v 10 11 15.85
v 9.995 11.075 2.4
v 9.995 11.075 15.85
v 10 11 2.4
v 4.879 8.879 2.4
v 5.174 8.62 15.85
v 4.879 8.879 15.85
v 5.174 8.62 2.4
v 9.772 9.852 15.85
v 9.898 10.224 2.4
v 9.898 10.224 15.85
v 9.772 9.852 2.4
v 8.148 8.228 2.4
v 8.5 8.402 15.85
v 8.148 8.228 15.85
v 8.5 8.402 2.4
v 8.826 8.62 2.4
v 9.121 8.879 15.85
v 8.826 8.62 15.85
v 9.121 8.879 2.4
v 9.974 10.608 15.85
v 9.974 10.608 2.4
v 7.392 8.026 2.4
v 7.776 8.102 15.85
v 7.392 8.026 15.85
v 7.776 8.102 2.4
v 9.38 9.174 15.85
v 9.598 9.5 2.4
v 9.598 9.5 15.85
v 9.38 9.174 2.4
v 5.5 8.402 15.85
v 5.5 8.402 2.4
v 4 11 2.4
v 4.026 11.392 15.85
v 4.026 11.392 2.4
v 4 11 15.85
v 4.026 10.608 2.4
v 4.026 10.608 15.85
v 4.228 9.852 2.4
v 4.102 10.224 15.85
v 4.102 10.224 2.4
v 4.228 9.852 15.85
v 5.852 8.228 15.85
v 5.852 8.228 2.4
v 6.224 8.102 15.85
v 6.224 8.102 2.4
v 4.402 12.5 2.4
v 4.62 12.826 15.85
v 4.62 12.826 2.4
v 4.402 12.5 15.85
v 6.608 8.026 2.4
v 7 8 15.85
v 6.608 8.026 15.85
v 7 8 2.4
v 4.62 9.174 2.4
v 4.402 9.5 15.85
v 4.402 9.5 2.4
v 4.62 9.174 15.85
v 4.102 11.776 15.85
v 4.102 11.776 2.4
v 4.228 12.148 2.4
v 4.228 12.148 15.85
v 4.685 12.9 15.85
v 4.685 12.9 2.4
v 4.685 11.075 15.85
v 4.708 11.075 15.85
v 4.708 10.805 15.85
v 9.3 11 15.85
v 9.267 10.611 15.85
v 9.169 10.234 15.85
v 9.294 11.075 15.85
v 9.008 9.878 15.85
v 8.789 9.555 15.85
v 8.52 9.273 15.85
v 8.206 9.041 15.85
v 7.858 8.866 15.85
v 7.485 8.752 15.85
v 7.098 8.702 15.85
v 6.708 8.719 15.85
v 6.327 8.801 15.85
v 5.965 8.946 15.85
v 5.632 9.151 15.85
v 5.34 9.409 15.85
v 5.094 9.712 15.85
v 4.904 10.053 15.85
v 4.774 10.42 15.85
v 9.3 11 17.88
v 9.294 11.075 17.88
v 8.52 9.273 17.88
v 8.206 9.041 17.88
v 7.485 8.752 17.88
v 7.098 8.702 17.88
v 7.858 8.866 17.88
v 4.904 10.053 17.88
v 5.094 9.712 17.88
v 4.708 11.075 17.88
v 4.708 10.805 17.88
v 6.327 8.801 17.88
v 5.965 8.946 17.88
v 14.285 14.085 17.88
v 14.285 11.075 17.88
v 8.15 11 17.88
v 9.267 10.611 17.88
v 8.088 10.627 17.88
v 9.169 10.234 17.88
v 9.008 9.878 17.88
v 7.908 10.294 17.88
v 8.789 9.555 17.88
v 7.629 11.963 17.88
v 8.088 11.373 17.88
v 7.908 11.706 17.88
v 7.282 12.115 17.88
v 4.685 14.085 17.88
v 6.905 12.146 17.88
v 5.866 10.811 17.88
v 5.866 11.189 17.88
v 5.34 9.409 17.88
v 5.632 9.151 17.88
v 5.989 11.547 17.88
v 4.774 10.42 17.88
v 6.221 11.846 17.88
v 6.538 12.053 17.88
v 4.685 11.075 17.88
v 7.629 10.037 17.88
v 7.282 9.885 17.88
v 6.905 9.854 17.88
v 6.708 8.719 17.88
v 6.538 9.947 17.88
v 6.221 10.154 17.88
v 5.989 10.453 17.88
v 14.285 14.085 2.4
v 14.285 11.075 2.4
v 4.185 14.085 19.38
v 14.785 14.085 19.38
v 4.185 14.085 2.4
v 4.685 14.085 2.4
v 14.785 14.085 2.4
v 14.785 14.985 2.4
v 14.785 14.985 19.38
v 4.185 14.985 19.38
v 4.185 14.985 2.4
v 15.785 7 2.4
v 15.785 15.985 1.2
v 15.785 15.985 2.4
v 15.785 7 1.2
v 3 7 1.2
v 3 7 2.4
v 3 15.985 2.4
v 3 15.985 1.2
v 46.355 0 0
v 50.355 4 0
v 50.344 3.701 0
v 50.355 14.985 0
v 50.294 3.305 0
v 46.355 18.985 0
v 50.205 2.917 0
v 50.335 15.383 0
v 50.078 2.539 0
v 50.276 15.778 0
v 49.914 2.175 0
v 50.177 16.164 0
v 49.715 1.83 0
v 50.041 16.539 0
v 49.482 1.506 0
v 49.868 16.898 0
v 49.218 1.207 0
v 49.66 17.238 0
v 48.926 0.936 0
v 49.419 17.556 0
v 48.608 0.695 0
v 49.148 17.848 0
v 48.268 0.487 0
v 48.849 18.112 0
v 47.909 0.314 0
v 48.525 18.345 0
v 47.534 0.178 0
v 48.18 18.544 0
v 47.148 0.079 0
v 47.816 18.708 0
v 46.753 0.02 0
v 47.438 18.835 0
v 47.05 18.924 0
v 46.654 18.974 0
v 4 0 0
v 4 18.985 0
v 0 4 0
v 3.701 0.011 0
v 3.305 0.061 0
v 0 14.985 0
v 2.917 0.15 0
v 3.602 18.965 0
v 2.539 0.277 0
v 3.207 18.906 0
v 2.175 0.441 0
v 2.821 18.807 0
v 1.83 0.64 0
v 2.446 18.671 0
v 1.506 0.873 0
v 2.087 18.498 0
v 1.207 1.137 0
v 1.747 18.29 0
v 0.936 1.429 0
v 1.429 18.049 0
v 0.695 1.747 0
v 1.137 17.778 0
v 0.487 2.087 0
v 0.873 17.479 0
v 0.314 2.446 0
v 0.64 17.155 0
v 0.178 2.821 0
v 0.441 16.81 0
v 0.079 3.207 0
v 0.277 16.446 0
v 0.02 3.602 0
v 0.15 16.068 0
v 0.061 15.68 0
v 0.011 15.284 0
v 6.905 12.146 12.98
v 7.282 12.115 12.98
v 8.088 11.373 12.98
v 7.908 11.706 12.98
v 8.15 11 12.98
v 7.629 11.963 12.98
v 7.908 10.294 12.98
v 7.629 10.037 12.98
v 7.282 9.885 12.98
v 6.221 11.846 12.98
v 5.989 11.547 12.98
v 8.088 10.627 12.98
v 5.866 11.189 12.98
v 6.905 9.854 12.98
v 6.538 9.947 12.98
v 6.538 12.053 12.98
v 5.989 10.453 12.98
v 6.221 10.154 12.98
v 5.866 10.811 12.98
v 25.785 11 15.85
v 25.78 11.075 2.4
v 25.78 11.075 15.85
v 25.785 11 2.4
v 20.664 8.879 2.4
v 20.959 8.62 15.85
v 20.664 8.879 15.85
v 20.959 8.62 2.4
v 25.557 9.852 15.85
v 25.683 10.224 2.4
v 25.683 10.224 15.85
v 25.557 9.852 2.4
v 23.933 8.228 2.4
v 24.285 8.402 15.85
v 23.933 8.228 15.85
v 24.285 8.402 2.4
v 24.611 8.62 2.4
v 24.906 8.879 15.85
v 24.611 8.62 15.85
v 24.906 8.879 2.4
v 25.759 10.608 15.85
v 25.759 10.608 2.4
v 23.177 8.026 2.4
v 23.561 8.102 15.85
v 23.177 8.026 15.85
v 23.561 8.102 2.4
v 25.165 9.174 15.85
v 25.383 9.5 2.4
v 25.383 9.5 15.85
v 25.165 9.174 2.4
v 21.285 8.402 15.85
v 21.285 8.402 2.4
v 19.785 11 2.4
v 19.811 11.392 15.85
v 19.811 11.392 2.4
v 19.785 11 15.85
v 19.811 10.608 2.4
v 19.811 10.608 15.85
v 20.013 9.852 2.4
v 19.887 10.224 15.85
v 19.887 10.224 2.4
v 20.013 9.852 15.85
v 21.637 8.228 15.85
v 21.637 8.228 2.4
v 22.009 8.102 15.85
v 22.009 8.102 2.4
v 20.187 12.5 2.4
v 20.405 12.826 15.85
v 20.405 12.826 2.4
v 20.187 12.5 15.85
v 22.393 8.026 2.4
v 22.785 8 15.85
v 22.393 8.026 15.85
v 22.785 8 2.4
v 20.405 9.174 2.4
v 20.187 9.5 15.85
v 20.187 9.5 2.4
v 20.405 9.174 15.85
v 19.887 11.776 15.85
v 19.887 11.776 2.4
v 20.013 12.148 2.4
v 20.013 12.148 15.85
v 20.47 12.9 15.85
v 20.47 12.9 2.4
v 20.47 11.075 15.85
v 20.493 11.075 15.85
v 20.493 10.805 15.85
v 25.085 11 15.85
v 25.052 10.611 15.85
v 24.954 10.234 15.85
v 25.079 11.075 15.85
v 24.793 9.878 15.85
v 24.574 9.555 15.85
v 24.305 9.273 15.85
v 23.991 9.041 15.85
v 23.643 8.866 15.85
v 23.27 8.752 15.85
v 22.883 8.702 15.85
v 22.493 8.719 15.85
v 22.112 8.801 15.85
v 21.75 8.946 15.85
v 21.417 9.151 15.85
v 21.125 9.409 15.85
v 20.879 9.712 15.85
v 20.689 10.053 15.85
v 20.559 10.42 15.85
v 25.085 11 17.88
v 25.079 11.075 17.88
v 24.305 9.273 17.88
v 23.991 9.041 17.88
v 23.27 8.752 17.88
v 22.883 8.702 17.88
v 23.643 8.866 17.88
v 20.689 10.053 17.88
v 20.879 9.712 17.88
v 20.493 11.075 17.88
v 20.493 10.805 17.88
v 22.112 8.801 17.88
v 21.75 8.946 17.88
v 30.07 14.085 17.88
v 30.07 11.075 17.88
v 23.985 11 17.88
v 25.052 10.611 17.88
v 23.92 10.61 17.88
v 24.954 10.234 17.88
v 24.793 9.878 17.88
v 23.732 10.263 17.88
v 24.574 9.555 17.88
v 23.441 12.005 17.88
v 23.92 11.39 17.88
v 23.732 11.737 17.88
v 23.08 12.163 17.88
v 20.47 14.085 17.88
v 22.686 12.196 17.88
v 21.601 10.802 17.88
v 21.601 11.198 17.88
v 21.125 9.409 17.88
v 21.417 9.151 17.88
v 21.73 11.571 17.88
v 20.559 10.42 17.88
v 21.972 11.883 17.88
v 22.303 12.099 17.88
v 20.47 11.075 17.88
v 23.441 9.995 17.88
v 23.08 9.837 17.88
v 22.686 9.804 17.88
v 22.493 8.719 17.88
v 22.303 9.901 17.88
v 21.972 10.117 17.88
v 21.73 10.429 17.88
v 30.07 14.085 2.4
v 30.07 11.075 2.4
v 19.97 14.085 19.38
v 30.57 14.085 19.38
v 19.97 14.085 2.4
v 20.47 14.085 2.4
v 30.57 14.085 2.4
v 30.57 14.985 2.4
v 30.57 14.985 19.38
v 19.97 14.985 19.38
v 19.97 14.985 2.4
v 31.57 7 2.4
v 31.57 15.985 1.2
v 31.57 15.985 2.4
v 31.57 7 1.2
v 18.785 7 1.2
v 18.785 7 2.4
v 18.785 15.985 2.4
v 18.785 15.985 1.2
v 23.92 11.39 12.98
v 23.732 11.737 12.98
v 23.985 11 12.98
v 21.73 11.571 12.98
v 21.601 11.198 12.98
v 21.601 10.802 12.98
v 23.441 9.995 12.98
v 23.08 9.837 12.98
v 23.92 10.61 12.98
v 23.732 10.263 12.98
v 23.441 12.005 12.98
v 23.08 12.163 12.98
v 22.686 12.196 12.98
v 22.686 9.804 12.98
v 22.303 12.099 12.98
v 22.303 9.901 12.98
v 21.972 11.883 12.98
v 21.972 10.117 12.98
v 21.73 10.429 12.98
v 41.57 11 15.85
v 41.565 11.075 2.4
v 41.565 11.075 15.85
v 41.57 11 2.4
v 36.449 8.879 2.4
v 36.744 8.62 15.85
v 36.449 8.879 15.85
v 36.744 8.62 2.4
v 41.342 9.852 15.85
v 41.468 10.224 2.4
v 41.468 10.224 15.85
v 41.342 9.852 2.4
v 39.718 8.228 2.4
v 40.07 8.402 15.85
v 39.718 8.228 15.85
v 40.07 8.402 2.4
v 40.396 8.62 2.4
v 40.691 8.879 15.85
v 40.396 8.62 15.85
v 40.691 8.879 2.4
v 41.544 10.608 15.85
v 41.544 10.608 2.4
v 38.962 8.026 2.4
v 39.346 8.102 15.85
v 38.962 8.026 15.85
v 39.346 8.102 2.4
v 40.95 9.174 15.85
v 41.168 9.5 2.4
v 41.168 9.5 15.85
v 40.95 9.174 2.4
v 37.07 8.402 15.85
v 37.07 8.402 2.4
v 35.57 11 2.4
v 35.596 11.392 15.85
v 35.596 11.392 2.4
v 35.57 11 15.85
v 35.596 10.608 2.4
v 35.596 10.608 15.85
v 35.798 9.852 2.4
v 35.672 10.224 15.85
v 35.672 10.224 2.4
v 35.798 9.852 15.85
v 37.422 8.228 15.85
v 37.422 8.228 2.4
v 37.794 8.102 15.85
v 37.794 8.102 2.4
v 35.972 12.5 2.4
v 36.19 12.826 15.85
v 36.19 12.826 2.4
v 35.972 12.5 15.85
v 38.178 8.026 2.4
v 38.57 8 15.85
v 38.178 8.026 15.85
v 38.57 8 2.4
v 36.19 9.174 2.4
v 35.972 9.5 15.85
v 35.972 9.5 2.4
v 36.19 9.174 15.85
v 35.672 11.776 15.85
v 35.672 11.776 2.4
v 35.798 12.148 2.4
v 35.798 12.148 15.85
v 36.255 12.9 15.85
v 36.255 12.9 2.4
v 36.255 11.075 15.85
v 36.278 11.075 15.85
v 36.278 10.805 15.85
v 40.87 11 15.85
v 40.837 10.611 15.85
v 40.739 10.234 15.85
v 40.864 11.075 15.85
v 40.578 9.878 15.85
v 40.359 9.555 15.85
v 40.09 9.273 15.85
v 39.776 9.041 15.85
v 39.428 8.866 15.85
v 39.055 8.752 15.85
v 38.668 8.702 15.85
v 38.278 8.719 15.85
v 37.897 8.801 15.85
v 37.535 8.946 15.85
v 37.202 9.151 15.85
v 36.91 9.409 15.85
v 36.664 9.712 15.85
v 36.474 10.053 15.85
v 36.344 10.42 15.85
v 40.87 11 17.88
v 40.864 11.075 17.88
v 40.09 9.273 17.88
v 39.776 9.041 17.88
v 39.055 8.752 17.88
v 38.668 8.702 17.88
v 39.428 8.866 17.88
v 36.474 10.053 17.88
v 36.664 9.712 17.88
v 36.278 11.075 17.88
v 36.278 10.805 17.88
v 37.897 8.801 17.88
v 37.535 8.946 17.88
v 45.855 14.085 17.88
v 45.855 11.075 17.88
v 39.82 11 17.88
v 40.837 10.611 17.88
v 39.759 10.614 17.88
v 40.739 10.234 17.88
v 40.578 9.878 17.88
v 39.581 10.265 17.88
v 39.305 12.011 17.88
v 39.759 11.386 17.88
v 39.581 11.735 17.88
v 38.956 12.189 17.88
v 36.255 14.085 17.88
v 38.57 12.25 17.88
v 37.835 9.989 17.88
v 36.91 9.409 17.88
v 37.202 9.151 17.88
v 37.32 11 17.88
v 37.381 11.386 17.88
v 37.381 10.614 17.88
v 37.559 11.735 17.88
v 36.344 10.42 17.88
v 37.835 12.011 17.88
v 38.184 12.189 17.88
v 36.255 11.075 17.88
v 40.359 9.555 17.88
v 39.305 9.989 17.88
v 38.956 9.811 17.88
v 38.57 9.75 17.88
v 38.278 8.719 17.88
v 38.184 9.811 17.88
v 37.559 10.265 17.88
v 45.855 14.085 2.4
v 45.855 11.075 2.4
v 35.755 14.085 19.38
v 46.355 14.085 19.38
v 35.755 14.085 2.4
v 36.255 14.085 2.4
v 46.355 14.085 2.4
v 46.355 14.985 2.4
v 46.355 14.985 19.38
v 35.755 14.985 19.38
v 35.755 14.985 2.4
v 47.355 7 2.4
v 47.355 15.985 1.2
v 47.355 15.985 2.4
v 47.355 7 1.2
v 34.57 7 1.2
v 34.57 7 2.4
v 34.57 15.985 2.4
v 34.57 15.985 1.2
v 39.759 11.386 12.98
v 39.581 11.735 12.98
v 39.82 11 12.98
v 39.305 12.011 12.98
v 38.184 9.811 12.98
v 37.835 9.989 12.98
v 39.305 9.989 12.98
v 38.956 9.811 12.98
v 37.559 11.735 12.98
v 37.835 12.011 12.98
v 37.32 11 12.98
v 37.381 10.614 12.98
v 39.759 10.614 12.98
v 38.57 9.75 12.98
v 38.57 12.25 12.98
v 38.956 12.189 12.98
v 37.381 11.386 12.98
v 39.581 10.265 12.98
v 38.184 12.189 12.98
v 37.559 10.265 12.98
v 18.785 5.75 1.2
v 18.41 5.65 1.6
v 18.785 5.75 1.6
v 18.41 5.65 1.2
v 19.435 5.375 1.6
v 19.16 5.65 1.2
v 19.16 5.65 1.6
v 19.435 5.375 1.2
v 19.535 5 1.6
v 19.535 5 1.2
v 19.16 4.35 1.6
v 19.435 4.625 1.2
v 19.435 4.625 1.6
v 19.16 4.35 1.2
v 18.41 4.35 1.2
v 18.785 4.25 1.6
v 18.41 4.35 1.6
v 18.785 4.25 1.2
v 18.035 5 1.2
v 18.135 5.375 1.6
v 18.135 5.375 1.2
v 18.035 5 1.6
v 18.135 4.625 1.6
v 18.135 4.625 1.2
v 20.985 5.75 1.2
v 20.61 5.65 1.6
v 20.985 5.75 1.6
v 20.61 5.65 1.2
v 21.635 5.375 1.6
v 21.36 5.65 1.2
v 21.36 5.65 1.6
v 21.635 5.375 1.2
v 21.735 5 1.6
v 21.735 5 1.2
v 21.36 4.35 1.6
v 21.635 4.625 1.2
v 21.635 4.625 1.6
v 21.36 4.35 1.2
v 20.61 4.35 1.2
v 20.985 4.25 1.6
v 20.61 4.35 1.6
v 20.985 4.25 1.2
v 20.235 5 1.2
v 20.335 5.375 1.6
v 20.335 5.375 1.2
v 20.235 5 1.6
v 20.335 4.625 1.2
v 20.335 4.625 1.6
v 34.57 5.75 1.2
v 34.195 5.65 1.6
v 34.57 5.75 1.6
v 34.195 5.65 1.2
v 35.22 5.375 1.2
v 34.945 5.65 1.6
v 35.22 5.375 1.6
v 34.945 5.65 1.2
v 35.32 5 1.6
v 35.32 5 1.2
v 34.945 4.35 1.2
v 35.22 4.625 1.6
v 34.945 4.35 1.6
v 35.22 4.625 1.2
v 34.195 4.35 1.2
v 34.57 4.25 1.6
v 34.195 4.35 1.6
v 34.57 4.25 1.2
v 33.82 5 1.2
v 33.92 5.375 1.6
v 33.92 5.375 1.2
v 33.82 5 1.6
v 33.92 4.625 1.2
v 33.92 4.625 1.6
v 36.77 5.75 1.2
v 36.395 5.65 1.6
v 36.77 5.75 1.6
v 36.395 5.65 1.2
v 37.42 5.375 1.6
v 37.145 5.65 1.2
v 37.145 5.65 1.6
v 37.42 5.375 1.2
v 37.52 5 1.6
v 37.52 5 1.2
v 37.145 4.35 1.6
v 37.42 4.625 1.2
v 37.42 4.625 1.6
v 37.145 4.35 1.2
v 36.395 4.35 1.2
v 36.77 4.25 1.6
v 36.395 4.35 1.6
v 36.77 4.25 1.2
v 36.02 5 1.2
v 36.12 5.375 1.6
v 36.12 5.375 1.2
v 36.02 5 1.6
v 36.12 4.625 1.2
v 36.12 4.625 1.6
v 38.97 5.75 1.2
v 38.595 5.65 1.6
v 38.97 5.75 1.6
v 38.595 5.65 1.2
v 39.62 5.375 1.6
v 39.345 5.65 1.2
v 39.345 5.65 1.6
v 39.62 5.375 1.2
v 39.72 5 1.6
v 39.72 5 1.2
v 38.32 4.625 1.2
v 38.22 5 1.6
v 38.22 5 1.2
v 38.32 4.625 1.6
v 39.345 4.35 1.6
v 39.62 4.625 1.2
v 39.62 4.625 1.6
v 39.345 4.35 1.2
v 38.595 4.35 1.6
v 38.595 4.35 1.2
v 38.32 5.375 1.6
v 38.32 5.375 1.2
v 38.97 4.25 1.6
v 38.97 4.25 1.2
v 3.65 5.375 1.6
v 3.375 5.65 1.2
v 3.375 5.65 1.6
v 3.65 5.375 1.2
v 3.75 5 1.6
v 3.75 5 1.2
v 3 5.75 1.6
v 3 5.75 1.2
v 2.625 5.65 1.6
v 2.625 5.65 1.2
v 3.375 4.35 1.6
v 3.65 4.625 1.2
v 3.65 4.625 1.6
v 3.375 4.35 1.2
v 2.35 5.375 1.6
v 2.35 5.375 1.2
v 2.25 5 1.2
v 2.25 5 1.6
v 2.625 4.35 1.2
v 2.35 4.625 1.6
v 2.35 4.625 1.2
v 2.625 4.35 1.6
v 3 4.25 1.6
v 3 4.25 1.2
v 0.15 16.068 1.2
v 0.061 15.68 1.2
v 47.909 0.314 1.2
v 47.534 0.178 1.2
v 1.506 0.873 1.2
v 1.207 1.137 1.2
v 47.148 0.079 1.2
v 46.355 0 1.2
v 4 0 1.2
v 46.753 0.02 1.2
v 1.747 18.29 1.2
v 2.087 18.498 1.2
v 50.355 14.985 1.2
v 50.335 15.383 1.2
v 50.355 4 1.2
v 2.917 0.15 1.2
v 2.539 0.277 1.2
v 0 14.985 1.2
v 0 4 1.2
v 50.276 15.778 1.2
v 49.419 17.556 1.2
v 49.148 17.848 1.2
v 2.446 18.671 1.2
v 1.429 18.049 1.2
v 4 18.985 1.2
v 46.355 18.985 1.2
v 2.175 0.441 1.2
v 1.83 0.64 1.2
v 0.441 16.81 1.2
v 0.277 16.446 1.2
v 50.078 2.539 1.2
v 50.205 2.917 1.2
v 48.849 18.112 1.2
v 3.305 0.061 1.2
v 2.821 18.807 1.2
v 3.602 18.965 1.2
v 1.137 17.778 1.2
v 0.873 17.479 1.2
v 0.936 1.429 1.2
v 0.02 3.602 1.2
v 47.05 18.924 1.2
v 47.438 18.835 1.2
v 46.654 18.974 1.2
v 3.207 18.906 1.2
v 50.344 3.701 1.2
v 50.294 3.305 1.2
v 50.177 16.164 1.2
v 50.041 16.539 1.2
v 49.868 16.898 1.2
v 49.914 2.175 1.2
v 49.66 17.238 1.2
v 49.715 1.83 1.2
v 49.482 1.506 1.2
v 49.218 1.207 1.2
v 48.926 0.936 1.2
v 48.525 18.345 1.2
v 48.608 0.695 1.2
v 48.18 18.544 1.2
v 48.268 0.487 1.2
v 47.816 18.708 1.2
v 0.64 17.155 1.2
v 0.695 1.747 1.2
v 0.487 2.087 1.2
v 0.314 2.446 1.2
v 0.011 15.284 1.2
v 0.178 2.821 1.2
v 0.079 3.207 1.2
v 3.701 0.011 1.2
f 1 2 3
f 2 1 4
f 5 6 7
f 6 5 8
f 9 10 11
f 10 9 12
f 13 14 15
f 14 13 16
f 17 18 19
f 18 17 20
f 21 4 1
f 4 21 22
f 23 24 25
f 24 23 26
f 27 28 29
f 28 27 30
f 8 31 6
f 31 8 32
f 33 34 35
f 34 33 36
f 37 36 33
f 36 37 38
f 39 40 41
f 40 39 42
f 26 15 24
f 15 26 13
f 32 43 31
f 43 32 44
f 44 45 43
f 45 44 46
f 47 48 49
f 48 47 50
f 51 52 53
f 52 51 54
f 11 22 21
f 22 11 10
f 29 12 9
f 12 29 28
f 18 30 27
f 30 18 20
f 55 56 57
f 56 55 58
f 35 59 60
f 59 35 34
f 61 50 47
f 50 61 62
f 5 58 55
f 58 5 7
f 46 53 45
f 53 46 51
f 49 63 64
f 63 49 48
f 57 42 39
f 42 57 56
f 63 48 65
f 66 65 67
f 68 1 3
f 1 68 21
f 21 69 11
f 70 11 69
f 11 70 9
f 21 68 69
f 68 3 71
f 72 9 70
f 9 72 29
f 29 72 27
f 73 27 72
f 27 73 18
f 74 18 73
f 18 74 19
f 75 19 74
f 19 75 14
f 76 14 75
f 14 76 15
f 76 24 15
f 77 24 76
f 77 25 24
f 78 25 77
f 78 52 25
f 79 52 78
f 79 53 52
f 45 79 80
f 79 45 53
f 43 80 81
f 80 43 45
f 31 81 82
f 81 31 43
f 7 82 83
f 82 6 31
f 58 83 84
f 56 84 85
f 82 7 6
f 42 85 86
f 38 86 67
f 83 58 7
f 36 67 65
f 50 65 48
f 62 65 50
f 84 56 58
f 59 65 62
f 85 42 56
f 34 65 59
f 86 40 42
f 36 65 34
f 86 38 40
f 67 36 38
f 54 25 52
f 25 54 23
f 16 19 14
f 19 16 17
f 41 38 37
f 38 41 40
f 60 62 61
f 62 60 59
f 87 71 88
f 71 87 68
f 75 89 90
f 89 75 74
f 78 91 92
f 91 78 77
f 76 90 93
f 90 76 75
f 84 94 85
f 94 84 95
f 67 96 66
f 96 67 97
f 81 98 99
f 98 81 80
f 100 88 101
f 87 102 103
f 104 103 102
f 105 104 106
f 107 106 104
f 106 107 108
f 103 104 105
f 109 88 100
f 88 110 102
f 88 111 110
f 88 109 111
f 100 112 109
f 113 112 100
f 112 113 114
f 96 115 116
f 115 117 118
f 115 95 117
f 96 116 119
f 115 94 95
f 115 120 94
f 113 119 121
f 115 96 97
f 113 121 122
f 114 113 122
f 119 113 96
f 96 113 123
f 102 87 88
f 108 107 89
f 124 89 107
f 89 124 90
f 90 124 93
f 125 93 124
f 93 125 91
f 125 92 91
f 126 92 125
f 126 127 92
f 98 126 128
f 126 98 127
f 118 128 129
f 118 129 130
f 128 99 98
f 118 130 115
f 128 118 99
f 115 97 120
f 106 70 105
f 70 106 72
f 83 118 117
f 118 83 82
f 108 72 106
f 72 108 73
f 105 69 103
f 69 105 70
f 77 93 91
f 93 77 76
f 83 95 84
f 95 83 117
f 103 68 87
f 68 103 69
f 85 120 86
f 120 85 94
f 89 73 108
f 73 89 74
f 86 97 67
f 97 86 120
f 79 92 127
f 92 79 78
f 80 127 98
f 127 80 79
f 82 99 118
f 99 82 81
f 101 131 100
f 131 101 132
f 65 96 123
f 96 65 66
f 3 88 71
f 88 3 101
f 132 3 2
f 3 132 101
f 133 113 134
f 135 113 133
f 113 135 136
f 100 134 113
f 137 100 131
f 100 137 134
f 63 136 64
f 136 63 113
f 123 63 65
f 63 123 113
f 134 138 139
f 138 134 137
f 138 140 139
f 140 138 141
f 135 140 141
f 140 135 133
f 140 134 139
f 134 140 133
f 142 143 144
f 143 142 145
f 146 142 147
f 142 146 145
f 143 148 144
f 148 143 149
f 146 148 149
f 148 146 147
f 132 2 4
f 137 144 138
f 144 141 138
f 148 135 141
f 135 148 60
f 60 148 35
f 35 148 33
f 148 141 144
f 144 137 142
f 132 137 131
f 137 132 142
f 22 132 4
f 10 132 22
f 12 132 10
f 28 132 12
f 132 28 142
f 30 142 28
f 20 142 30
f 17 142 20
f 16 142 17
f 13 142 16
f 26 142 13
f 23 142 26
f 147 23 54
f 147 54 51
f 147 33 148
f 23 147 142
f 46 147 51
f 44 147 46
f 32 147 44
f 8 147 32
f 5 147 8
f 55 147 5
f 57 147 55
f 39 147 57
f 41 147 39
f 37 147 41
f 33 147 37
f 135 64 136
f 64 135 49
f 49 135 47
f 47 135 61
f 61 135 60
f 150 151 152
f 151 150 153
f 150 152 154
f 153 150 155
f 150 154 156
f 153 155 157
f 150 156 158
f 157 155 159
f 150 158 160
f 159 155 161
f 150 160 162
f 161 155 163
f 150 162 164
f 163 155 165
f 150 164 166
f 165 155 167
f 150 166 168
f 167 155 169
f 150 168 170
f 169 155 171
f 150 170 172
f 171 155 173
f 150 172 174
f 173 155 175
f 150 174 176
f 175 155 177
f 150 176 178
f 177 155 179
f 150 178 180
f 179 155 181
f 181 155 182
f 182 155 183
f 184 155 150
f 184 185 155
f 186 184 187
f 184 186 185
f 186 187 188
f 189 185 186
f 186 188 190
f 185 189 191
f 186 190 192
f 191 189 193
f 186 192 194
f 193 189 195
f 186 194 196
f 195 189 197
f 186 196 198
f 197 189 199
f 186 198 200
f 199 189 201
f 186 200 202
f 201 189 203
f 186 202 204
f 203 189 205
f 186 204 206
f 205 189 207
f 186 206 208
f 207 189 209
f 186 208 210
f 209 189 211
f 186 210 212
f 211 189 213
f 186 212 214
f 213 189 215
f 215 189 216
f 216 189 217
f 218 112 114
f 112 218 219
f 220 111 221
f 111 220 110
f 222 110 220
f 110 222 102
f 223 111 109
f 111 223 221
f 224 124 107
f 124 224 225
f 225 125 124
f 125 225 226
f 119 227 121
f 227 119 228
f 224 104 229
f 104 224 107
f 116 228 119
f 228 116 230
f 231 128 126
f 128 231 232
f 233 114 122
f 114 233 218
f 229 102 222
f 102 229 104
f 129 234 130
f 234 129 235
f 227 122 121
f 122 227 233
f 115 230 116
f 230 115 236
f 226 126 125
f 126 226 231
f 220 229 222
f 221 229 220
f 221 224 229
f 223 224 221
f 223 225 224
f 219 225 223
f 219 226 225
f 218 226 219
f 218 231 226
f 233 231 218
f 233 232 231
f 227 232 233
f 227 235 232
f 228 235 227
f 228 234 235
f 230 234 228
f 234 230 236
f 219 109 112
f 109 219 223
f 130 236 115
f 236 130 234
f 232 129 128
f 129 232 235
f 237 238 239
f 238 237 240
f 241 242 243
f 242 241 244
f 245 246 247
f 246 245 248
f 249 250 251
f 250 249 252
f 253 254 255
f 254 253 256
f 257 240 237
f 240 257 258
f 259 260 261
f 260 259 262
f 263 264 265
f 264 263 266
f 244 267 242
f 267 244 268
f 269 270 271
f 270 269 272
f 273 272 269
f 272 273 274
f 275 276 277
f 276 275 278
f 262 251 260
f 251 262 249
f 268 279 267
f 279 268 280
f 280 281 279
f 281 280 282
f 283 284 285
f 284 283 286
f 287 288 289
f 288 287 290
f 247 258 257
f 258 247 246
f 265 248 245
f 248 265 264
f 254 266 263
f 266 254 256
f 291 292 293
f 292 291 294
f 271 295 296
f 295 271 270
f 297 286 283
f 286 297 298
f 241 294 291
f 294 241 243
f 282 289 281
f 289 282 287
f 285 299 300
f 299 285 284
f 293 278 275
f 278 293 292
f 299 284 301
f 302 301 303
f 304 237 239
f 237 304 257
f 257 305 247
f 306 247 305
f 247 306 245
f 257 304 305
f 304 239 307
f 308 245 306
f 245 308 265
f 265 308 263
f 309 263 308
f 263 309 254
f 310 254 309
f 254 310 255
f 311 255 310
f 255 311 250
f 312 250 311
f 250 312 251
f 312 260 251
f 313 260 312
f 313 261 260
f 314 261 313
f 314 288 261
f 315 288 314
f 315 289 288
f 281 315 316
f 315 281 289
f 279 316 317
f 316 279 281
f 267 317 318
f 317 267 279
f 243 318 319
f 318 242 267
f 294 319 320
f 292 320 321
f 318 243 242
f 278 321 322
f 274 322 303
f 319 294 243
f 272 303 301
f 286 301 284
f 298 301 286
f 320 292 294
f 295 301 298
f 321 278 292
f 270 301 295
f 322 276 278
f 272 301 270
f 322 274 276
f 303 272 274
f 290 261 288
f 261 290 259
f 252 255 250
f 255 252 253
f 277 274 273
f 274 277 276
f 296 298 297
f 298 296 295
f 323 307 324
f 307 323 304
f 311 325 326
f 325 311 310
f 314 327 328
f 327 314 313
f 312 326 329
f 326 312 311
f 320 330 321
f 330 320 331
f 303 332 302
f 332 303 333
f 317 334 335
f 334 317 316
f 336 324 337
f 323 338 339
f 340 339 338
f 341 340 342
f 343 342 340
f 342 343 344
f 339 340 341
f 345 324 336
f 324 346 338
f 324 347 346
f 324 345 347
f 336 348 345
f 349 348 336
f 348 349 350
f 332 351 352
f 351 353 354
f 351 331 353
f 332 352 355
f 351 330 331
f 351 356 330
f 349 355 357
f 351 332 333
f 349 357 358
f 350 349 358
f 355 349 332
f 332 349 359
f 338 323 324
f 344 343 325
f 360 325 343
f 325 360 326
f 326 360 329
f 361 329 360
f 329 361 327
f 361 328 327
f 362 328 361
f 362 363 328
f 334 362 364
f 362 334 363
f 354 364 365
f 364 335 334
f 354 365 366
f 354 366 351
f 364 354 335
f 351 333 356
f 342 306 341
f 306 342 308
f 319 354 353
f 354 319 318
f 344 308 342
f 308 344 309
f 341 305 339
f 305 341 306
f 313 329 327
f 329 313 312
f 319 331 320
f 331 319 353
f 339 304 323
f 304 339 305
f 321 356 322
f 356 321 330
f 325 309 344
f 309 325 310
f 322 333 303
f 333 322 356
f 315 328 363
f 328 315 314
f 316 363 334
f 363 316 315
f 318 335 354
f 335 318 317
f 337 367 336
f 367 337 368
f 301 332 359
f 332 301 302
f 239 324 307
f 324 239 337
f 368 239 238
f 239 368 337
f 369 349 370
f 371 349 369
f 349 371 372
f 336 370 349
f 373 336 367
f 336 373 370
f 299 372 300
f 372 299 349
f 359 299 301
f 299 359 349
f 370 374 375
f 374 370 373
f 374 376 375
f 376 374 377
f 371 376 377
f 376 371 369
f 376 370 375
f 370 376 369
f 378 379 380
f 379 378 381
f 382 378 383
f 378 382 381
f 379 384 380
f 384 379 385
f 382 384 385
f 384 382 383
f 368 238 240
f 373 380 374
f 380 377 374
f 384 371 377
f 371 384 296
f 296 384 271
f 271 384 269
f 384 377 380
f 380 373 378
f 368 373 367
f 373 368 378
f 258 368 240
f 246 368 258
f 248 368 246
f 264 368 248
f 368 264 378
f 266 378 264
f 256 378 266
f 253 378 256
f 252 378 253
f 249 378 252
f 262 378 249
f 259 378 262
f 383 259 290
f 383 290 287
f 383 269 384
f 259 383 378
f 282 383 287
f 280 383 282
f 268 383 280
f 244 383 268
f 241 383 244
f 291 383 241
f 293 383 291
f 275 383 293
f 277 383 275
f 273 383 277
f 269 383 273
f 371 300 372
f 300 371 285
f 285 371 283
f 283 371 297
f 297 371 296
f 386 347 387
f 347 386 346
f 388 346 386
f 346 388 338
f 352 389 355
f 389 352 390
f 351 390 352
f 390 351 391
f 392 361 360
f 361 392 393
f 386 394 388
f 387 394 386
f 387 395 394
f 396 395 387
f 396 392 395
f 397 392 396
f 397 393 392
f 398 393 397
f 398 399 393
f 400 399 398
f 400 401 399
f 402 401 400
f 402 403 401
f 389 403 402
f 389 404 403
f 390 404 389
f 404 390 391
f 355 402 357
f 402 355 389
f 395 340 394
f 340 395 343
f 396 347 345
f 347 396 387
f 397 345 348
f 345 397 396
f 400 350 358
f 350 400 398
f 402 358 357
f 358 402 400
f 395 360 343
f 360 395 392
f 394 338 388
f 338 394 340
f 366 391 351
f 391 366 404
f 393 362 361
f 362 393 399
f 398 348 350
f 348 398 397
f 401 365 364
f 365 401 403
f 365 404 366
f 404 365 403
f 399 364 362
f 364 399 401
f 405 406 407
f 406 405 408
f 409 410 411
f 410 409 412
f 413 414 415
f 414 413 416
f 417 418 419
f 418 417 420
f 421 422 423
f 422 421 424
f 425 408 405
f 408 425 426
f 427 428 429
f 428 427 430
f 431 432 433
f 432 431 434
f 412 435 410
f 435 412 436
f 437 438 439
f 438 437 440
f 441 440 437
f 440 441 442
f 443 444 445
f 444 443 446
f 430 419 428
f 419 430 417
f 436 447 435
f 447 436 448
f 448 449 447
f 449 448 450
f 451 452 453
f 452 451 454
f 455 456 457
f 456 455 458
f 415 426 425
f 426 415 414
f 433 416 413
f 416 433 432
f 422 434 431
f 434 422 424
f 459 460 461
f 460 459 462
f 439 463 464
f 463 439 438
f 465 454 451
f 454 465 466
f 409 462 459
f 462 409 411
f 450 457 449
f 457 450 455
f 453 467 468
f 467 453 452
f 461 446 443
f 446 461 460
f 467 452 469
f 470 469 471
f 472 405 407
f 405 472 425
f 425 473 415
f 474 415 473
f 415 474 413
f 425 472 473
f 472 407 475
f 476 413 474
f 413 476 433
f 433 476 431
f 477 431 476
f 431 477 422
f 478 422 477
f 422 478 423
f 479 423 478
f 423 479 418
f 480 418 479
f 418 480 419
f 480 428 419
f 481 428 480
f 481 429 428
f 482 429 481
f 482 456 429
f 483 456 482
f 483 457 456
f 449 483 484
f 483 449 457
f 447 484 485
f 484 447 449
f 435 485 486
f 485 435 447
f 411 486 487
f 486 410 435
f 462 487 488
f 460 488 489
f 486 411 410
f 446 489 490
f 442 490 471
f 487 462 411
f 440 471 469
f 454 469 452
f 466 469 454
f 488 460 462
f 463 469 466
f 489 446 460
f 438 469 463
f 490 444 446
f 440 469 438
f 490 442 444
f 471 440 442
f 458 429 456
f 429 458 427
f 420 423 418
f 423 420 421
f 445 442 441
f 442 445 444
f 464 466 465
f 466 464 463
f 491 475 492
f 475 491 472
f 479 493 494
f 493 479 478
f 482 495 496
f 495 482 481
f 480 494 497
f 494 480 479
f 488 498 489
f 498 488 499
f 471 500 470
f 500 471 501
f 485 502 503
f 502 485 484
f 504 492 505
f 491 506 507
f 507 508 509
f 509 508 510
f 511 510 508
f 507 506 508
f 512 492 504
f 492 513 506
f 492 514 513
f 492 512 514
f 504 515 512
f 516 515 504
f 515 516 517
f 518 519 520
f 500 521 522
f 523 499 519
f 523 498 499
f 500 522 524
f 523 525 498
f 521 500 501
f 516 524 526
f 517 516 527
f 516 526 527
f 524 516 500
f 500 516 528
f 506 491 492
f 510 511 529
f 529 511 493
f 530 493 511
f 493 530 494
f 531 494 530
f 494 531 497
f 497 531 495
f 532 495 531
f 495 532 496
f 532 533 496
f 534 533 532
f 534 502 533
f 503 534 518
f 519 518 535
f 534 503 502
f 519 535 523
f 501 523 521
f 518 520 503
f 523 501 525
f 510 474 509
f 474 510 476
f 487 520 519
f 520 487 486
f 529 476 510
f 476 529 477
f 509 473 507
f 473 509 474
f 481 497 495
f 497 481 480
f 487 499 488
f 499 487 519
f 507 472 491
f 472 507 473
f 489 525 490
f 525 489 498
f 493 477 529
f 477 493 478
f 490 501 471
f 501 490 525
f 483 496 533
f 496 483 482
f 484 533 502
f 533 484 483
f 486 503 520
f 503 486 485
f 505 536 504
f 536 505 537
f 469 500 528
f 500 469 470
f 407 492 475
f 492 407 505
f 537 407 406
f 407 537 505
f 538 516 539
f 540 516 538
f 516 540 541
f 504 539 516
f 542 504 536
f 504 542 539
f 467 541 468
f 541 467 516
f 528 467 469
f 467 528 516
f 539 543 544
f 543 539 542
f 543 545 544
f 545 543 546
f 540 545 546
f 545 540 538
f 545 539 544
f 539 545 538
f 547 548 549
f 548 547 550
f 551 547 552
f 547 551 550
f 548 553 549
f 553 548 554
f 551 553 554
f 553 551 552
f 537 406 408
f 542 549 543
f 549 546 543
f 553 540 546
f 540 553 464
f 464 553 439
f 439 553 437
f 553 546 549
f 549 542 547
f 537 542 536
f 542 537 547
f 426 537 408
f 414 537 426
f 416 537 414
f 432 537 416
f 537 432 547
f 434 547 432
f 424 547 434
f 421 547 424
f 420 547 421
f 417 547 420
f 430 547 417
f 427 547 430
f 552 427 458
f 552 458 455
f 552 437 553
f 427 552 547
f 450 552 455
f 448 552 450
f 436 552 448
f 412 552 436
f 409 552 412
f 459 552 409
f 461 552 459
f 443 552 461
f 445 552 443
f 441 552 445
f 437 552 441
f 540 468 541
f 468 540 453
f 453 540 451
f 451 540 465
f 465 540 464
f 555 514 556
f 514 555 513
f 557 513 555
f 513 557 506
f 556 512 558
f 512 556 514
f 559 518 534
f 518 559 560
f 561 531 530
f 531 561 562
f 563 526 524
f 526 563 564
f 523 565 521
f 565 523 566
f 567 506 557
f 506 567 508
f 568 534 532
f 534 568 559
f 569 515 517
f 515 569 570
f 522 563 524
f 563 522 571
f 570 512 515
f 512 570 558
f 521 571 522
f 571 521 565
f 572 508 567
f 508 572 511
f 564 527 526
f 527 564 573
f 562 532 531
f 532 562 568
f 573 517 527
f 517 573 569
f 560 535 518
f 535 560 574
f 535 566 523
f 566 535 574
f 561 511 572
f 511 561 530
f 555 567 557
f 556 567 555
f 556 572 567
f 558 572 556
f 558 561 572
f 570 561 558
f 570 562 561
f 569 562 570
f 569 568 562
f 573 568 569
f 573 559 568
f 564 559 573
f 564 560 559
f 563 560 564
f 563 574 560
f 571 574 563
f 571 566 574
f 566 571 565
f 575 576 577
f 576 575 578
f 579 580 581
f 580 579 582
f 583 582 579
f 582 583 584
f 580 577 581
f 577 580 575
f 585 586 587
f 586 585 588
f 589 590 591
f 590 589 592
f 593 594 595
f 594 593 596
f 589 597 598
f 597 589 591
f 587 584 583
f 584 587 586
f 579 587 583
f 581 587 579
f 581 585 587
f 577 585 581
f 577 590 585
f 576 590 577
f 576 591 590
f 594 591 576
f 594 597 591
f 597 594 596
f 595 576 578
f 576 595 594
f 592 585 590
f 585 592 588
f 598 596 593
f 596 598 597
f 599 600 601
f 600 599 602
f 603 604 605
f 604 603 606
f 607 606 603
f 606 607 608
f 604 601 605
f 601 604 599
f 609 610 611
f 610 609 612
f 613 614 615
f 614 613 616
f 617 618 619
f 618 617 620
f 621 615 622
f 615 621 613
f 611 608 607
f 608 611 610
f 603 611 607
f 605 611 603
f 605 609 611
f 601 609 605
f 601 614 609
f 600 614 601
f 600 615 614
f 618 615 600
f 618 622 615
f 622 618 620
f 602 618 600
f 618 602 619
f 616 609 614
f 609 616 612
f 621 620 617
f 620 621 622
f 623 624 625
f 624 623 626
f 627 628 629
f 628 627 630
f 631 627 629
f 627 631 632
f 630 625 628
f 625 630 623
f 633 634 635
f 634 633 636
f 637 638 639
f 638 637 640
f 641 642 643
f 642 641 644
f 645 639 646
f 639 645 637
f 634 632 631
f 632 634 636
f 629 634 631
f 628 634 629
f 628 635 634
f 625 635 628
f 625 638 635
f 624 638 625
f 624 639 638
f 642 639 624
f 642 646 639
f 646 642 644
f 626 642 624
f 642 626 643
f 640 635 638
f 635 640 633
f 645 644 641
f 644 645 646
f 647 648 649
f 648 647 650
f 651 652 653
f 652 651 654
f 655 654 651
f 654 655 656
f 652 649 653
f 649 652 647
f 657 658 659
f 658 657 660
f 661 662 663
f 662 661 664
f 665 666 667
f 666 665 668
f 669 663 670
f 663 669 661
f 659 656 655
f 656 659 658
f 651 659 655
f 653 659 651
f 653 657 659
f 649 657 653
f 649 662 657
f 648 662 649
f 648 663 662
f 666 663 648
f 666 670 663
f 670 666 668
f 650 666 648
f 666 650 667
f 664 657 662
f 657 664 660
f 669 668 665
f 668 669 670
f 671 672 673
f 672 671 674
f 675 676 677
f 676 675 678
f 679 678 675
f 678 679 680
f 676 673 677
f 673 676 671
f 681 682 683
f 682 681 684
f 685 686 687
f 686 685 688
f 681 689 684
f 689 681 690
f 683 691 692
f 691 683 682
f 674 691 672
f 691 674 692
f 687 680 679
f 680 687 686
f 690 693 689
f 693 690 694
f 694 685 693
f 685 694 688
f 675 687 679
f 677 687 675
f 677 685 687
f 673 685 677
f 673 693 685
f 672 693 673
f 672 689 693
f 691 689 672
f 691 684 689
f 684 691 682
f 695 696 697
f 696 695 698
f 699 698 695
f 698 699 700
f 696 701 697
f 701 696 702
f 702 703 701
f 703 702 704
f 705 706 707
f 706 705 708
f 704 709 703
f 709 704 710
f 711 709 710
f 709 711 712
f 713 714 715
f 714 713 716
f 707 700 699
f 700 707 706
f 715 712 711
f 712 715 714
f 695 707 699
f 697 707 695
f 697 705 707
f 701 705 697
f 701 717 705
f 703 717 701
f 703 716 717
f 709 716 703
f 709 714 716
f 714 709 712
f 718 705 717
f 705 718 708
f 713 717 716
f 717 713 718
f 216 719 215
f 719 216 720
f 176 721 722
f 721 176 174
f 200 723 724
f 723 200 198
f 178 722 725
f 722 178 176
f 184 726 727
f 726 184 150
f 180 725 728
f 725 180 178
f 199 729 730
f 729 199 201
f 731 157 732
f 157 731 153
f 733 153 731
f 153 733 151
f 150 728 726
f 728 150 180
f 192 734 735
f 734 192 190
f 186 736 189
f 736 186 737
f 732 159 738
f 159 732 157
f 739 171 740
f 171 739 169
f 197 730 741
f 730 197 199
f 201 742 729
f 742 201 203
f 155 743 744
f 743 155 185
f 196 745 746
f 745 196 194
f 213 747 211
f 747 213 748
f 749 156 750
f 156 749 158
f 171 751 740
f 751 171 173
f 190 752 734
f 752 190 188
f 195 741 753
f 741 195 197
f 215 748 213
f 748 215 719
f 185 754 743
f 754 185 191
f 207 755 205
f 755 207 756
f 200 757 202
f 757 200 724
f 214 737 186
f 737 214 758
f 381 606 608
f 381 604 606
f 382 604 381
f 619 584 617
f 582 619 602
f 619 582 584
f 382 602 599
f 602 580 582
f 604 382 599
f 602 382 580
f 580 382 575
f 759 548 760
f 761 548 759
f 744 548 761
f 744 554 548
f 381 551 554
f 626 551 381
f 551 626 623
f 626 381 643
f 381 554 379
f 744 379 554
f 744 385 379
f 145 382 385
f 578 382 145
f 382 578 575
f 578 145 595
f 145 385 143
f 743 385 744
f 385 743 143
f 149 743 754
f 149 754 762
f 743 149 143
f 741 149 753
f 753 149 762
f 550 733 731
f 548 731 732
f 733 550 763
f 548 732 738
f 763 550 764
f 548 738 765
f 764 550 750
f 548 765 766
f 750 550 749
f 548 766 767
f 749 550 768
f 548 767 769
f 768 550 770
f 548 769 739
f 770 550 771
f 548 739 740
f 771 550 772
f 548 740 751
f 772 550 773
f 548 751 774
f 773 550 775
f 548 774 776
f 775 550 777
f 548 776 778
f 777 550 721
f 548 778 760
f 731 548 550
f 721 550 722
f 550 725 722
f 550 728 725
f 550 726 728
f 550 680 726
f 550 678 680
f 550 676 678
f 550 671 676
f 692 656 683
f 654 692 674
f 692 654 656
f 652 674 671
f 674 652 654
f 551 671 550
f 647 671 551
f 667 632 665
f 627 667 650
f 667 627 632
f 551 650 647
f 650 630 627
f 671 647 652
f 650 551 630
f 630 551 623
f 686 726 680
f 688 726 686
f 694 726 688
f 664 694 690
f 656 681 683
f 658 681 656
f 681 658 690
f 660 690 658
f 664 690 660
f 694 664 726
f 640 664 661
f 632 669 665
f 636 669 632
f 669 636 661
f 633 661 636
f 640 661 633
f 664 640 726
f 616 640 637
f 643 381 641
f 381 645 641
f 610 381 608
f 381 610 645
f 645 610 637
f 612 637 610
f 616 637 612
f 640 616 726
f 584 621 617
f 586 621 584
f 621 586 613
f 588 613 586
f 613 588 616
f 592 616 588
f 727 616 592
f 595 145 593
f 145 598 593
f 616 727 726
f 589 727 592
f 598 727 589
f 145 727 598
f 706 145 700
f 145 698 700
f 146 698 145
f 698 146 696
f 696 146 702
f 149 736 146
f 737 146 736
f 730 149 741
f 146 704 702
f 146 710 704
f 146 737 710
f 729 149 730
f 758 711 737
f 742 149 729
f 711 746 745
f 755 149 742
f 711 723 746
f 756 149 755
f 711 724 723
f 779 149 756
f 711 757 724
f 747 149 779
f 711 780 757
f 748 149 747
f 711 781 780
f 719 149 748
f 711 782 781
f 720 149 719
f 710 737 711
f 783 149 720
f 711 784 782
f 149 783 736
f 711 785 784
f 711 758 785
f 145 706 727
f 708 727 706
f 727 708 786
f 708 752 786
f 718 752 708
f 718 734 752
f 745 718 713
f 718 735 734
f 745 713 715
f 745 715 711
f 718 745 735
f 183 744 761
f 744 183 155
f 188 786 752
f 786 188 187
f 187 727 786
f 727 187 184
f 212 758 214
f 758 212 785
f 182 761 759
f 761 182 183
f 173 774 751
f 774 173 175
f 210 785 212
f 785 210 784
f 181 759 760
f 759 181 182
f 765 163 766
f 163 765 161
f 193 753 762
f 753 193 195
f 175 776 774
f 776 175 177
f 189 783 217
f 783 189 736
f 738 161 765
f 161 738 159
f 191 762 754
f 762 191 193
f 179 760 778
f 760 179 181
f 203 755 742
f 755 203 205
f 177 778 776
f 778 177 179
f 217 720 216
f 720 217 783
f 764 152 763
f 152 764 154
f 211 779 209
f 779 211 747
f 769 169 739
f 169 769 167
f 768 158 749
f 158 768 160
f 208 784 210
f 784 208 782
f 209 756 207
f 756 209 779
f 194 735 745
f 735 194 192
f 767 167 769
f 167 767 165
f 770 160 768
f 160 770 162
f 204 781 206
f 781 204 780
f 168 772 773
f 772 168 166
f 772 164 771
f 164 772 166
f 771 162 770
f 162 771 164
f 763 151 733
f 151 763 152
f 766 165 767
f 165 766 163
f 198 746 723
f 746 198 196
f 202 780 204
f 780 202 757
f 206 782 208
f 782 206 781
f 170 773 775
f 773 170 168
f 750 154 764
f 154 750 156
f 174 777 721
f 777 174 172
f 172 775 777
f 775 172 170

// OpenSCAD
// SPDX-FileCopyrightText: 2026 Alon A. Rabinowitz
// SPDX-License-Identifier: CERN-OHL-S-2.0
// Open hardware, made available under the CERN Open Hardware Licence v2 - Strongly Reciprocal
// (LICENSES/CERN-OHL-S-2.0.txt), without any express or implied warranty: see the licence for its conditions.

/*
The clearance test for the air-quality monitor: one small print that tries every untested fit in
air-quality-monitor.params.scad at three settings - a step tighter, as set, and a step looser - so the box
is printed with fits that were tried in ASA on this printer rather than guessed.

It INCLUDES the box, and every piece is the box's own geometry, drawn by the box's own modules with only
the fit changed and turned onto the bed as the back plate is. So the test cannot drift from what it
tests, and each piece prints the way it will in the box. Each try carries 1, 2 or 3 dots: 1 = a step
tighter, 2 = as set, 3 = a step looser. docs/clearance-test.md says what to try with each, how to turn
the result into a setting, and what has been found so far.

  M  gy_pilot_d   three of the SGP41's mounts - post, rib and ledge - each with its pilot upright

This is the third round. The first two, of 2 Oct and 3 Oct 2026, settled every other fit; their pieces
are in the history.

draw_fits = false after including this file draws nothing, as fits-map.scad does.
*/
include <air-quality-monitor.scad>
draw_model = false;   // after the include: the box's own parts stay undrawn
draw_fits = true;

fit_step = 0.1;             // the step for every fit here
m = 3;                      // margin round and between the pieces
row = 4;                    // gap in front of each try, towards the printer's front; its dots sit in it
dot_d = 1.5;                // the tags: about three beads across, two layers proud
base_t = 6 * fdm_layer_h;   // 1.2 mm: the floor everything stands on

function ladder(v, s) = [v - s, v, v + s];
// Smaller is tighter. No hole may go under 2 mm (the rules below), so with the pilot at 2.0 the ladder
// starts there instead: 1 dot is then the setting itself.
gy_pilots = ladder(max(gy_pilot_d, 2 + fit_step), fit_step);

// The box's geometry is drawn in its own frame - X across, Y out from the wall, Z up - and the back plate
// prints flat on its back. This is the turn its part file makes: the box's Y comes up off the bed.
module to_bed() rotate([90, 0, 0]) children();

// ------------------------------------------------------------------ M: the SGP41's mounts
// The box's post, rib and ledge, on as much plate as they stand on, the pilot down the post. Screwed on,
// the module reaches past the pad towards the printer's front, above the dots.
m_x0 = min(gy_hx - gy_post_d / 2, gy_x0) - 1;        // the pad, in the box's frame
m_x1 = max(gy_hx + gy_post_d / 2, gy_x1) + 1;
m_z0 = gy_z0 - pocket_fit - rim_t - 1;
m_z1 = max(gy_hz + gy_post_d / 2, gy_rib_z1) + 1;
module m_piece(d) difference() {                    // in the box's frame
    union() {
        gy_mount();
        box3([m_x0, 0, m_z0], [m_x1, back_t, m_z1]);
    }
    gy_pilot(d);
}

// ------------------------------------------------------------------ layout: one row
m_w  = m_x1 - m_x0;                         // a piece across, on the bed
m_d  = m_z1 - m_z0;                         // and front to back
m_y  = m + row;                             // each pad's front edge
m_xs = [for (i = [0 : 2]) m + i * (m_w + m)];
BW = m + 3 * m_w + 2 * m + m;
BH = m_y + m_d + m;

// ------------------------------------------------------------------ the rules
assert(min(gy_pilots) >= 2, "a hole under 2 mm distorts or closes up - fdm-design-rules §2");
assert(whole(base_t / fdm_layer_h), "printed flat: whole layers only");

// ------------------------------------------------------------------ pieces
module tag(n, x, y, z = base_t)
    for (i = [0 : n - 1])
        translate([x + i * (dot_d + 0.7), y + dot_d / 2, z - eps]) cylinder(d = dot_d, h = 2 * fdm_layer_h + eps);

// every try's dots, in the gap in front of it - a module of their own, so fits-map.scad can show them in a
// colour
module tags() for (i = [0 : 2]) tag(i + 1, m_xs[i], m_y - row / 2 - dot_d / 2);

// ------------------------------------------------------------------ the part
module fits() union() {
    // the base, corners rounded against ASA's lifting
    linear_extrude(height = base_t) offset(r = corner_r) offset(delta = -corner_r) square([BW, BH]);
    for (i = [0 : 2]) translate([m_xs[i] - m_x0, m_y + m_z1, 0]) to_bed() m_piece(gy_pilots[i]);
    tags();
}

echo(str("clearance test: ", BW, " x ", BH, " mm base; dots 1 / 2 / 3 = a step tighter / as set / a step looser"));
echo(str("  M gy_pilot_d ", gy_pilots, ", the post's top ", gy_standoff_d, " mm across"));

if (draw_fits) fits();
